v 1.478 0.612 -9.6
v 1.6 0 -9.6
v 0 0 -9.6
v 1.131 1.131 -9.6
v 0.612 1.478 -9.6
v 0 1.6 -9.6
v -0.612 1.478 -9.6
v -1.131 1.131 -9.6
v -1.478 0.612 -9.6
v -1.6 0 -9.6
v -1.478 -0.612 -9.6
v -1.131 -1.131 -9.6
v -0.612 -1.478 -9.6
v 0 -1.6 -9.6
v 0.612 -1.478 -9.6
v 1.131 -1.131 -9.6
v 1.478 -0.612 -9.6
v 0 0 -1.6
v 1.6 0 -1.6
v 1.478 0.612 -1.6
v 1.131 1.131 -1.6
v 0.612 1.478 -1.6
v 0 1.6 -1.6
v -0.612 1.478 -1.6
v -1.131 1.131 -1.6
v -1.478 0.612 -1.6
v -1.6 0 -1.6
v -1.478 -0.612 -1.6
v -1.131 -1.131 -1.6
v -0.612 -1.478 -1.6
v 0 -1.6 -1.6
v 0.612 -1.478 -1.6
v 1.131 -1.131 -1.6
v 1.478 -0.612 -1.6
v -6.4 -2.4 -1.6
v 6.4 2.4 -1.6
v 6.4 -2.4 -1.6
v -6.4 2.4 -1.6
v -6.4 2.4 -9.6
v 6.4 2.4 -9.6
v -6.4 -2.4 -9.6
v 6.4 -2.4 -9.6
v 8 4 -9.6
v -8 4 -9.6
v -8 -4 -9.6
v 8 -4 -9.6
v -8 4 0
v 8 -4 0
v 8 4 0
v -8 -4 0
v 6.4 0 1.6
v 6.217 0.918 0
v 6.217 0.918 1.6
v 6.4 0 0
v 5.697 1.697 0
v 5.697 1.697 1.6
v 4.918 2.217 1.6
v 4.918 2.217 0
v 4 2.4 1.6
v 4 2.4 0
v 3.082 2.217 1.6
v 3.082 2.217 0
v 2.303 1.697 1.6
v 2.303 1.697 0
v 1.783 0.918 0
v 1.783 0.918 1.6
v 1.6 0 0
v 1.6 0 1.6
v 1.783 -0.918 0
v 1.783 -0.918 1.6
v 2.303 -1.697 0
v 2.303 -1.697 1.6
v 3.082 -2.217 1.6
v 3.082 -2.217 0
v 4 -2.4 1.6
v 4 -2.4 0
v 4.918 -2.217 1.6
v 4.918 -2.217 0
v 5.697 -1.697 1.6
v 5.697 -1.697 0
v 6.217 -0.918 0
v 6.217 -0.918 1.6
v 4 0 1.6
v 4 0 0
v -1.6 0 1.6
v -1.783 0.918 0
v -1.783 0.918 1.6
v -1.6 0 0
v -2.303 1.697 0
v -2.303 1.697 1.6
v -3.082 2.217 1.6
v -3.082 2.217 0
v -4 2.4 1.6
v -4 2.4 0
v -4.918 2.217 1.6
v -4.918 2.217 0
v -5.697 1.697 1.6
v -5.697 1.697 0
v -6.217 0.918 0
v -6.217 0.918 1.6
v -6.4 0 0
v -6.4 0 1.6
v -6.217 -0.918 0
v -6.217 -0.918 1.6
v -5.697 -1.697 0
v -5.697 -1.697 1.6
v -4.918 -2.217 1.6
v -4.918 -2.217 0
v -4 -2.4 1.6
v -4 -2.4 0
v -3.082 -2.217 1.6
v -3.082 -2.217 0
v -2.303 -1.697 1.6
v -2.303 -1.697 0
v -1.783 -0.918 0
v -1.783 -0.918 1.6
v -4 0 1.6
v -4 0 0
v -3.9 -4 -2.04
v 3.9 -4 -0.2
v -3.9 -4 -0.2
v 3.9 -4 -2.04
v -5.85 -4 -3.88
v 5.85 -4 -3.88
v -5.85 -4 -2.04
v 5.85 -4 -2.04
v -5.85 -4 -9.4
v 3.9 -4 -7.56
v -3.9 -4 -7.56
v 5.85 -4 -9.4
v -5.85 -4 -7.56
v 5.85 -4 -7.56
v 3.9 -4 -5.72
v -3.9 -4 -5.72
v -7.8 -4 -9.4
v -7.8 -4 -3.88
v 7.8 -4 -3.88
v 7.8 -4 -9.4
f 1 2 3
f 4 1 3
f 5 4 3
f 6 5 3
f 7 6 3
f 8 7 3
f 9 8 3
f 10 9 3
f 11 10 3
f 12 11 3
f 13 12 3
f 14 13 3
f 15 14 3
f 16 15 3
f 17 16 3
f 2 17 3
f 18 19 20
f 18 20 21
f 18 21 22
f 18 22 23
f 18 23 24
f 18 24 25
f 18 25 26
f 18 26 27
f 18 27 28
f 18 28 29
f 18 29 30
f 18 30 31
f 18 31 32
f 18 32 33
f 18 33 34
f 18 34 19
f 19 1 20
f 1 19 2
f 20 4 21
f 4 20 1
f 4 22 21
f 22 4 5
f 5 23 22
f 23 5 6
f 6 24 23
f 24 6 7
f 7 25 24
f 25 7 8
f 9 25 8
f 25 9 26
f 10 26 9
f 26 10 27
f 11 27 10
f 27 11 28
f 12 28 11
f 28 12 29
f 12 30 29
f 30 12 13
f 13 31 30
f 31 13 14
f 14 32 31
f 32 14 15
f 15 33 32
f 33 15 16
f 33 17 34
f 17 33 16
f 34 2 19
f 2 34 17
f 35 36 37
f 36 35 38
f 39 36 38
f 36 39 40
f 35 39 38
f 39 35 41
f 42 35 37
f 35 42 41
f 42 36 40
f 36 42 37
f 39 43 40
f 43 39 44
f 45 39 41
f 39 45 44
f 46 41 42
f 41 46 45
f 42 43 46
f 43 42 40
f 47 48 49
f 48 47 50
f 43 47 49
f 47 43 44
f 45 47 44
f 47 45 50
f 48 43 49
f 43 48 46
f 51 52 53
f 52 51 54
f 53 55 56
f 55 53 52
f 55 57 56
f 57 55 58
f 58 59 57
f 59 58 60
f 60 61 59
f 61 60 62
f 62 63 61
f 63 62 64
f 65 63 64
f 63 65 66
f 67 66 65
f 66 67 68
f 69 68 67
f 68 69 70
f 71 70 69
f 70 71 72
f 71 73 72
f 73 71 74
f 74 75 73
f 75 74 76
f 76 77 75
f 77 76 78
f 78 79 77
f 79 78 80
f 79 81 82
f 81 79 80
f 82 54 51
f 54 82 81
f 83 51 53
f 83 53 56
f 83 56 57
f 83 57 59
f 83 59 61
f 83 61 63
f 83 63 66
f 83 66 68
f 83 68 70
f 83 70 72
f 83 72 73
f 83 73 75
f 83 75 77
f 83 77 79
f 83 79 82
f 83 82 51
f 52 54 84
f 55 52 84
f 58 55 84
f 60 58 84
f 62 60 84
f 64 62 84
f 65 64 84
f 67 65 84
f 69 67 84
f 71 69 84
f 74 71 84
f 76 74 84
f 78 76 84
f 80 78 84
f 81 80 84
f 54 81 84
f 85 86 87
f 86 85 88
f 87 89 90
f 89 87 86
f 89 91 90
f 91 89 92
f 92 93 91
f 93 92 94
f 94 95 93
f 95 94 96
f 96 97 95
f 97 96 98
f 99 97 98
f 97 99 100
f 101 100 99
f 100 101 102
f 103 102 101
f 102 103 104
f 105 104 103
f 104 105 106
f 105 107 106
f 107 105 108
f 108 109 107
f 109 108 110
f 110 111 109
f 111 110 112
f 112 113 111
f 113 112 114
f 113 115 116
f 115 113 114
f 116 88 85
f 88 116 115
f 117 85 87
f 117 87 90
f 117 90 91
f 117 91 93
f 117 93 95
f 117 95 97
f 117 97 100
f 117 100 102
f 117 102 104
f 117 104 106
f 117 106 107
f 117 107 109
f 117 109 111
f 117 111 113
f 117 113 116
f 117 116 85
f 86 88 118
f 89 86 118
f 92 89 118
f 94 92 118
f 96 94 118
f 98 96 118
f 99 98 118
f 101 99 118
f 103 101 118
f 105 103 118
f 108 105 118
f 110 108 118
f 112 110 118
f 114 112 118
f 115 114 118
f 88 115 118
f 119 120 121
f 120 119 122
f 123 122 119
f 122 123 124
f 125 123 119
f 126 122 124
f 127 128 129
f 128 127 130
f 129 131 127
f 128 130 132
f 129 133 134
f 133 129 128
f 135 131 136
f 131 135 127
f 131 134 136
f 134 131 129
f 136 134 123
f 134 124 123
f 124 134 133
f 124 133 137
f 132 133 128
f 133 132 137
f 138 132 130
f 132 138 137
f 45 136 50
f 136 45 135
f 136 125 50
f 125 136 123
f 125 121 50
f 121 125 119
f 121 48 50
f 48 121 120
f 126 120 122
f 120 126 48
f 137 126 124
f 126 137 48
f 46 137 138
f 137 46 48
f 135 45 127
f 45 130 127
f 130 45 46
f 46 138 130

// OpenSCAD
// file: ../p/4-4edge.scad
use <../lib.scad>
function ldraw_lib__4_4edge() = [
// 0 Circle 1.0
// 0 Name: 4-4edge.dat
// 0 Author: James Jessiman
// 0 !LDRAW_ORG Primitive UPDATE 2017-01
// 0 !LICENSE Licensed under CC BY 2.0 and CC BY 4.0 : see CAreadme.txt
// 
// 0 BFC CERTIFY CCW
  [0,"BFC","CERTIFY"],
  [0,"BFC","CCW"],
// 
// 0 !HISTORY 1998-12-15 [PTadmin] Official Update 1998-10
// 0 !HISTORY 2005-12-28 [PTadmin] Official Update 2005-01
// 0 !HISTORY 2007-06-24 [PTadmin] Header formatted for Contributor Agreement
// 0 !HISTORY 2008-07-01 [PTadmin] Official Update 2008-01
// 0 !HISTORY 2017-01-15 [Steffen] BFCed
// 0 !HISTORY 2017-12-30 [PTadmin] Official Update 2017-01
// 
// 
// 2 24 1 0 0 0.9239 0 0.3827
  [2,24,1,0,0,0.9239,0,0.3827],
// 2 24 0.9239 0 0.3827 0.7071 0 0.7071
  [2,24,0.9239,0,0.3827,0.7071,0,0.7071],
// 2 24 0.7071 0 0.7071 0.3827 0 0.9239
  [2,24,0.7071,0,0.7071,0.3827,0,0.9239],
// 2 24 0.3827 0 0.9239 0 0 1
  [2,24,0.3827,0,0.9239,0,0,1],
// 2 24 0 0 1 -0.3827 0 0.9239
  [2,24,0,0,1,-0.3827,0,0.9239],
// 2 24 -0.3827 0 0.9239 -0.7071 0 0.7071
  [2,24,-0.3827,0,0.9239,-0.7071,0,0.7071],
// 2 24 -0.7071 0 0.7071 -0.9239 0 0.3827
  [2,24,-0.7071,0,0.7071,-0.9239,0,0.3827],
// 2 24 -0.9239 0 0.3827 -1 0 -0
  [2,24,-0.9239,0,0.3827,-1,0,-0],
// 2 24 -1 0 -0 -0.9239 0 -0.3827
  [2,24,-1,0,-0,-0.9239,0,-0.3827],
// 2 24 -0.9239 0 -0.3827 -0.7071 0 -0.7071
  [2,24,-0.9239,0,-0.3827,-0.7071,0,-0.7071],
// 2 24 -0.7071 0 -0.7071 -0.3827 0 -0.9239
  [2,24,-0.7071,0,-0.7071,-0.3827,0,-0.9239],
// 2 24 -0.3827 0 -0.9239 0 0 -1
  [2,24,-0.3827,0,-0.9239,0,0,-1],
// 2 24 0 0 -1 0.3827 0 -0.9239
  [2,24,0,0,-1,0.3827,0,-0.9239],
// 2 24 0.3827 0 -0.9239 0.7071 0 -0.7071
  [2,24,0.3827,0,-0.9239,0.7071,0,-0.7071],
// 2 24 0.7071 0 -0.7071 0.9239 0 -0.3827
  [2,24,0.7071,0,-0.7071,0.9239,0,-0.3827],
// 2 24 0.9239 0 -0.3827 1 0 0
  [2,24,0.9239,0,-0.3827,1,0,0],
];
module ldraw_lib__4_4edge(step=0, col=false, unit=2/5, alt=false, line=0.2, solid=!$preview)
    makepoly(ldraw_lib__4_4edge(), step=step, col=col, unit=unit, alt=alt, line=line, solid=solid);
ldraw_lib__4_4edge(line=0.2);
// file: ../p/4-4disc.scad
use <../lib.scad>
function ldraw_lib__4_4disc() = [
// 0 Disc 1.0
// 0 Name: 4-4disc.dat
// 0 Author: James Jessiman
// 0 !LDRAW_ORG Primitive UPDATE 2002-02
// 0 !LICENSE Licensed under CC BY 2.0 and CC BY 4.0 : see CAreadme.txt
// 
// 0 BFC CERTIFY CCW
  [0,"BFC","CERTIFY"],
  [0,"BFC","CCW"],
// 
// 0 !HISTORY 1998-12-15 [PTadmin] Official Update 1998-10
// 0 !HISTORY 2002-03-23 [sbliss] Added BFC statement
// 0 !HISTORY 2002-04-25 [PTadmin] Official Update 2002-02
// 0 !HISTORY 2007-06-24 [PTadmin] Header formatted for Contributor Agreement
// 0 !HISTORY 2008-07-01 [PTadmin] Official Update 2008-01
// 
// 
// 3 16 0 0 0 1 0 0 0.9239 0 0.3827
  [3,16,0,0,0,1,0,0,0.9239,0,0.3827],
// 3 16 0 0 0 0.9239 0 0.3827 0.7071 0 0.7071
  [3,16,0,0,0,0.9239,0,0.3827,0.7071,0,0.7071],
// 3 16 0 0 0 0.7071 0 0.7071 0.3827 0 0.9239
  [3,16,0,0,0,0.7071,0,0.7071,0.3827,0,0.9239],
// 3 16 0 0 0 0.3827 0 0.9239 0 0 1
  [3,16,0,0,0,0.3827,0,0.9239,0,0,1],
// 3 16 0 0 0 0 0 1 -0.3827 0 0.9239
  [3,16,0,0,0,0,0,1,-0.3827,0,0.9239],
// 3 16 0 0 0 -0.3827 0 0.9239 -0.7071 0 0.7071
  [3,16,0,0,0,-0.3827,0,0.9239,-0.7071,0,0.7071],
// 3 16 0 0 0 -0.7071 0 0.7071 -0.9239 0 0.3827
  [3,16,0,0,0,-0.7071,0,0.7071,-0.9239,0,0.3827],
// 3 16 0 0 0 -0.9239 0 0.3827 -1 0 -0
  [3,16,0,0,0,-0.9239,0,0.3827,-1,0,-0],
// 3 16 0 0 0 -1 0 -0 -0.9239 0 -0.3827
  [3,16,0,0,0,-1,0,-0,-0.9239,0,-0.3827],
// 3 16 0 0 0 -0.9239 0 -0.3827 -0.7071 0 -0.7071
  [3,16,0,0,0,-0.9239,0,-0.3827,-0.7071,0,-0.7071],
// 3 16 0 0 0 -0.7071 0 -0.7071 -0.3827 0 -0.9239
  [3,16,0,0,0,-0.7071,0,-0.7071,-0.3827,0,-0.9239],
// 3 16 0 0 0 -0.3827 0 -0.9239 0 0 -1
  [3,16,0,0,0,-0.3827,0,-0.9239,0,0,-1],
// 3 16 0 0 0 0 0 -1 0.3827 0 -0.9239
  [3,16,0,0,0,0,0,-1,0.3827,0,-0.9239],
// 3 16 0 0 0 0.3827 0 -0.9239 0.7071 0 -0.7071
  [3,16,0,0,0,0.3827,0,-0.9239,0.7071,0,-0.7071],
// 3 16 0 0 0 0.7071 0 -0.7071 0.9239 0 -0.3827
  [3,16,0,0,0,0.7071,0,-0.7071,0.9239,0,-0.3827],
// 3 16 0 0 0 0.9239 0 -0.3827 1 0 0
  [3,16,0,0,0,0.9239,0,-0.3827,1,0,0],
// 0
];
module ldraw_lib__4_4disc(step=0, col=false, unit=2/5, alt=false, line=0.2, solid=!$preview)
    makepoly(ldraw_lib__4_4disc(), step=step, col=col, unit=unit, alt=alt, line=line, solid=solid);
ldraw_lib__4_4disc(line=0.2);
// file: ../p/4-4cyli.scad
use <../lib.scad>
$fa=1; $fs=0.2;
function ldraw_lib__4_4cyli(realsolid=false) = [
// 0 Cylinder 1.0
// 0 Name: 4-4cyli.dat
// 0 Author: James Jessiman
// 0 !LDRAW_ORG Primitive UPDATE 2005-01
// 0 !LICENSE Licensed under CC BY 2.0 and CC BY 4.0 : see CAreadme.txt
// 
// 0 BFC CERTIFY CCW
  [0,"BFC","CERTIFY"],
  [0,"BFC","CCW"],
// 
// 0 !HISTORY 1998-12-15 [PTadmin] Official Update 1998-10
// 0 !HISTORY 2002-03-23 [sbliss] Added BFC statement; merged headers from files in distributions LDraw 0.27 and Complete.
// 0 !HISTORY 2002-04-25 [PTadmin] Official Update 2002-02
// 0 !HISTORY 2004-12-14 [guyvivan] BFC CCW
// 0 !HISTORY 2005-12-28 [PTadmin] Official Update 2005-01
// 0 !HISTORY 2007-06-24 [PTadmin] Header formatted for Contributor Agreement
// 0 !HISTORY 2008-07-01 [PTadmin] Official Update 2008-01
// 
// 
// 4 16 1 1 0 0.9239 1 0.3827 0.9239 0 0.3827 1 0 0
  [4,16,1,1,0,0.9239,1,0.3827,0.9239,0,0.3827,1,0,0],
// 5 24 1 0 0 1 1 0 0.9239 0 0.3827 0.9239 0 -0.3827
  [5,24,1,0,0,1,1,0,0.9239,0,0.3827,0.9239,0,-0.3827],
// 4 16 0.9239 1 0.3827 0.7071 1 0.7071 0.7071 0 0.7071 0.9239 0 0.3827
  [4,16,0.9239,1,0.3827,0.7071,1,0.7071,0.7071,0,0.7071,0.9239,0,0.3827],
// 5 24 0.9239 0 0.3827 0.9239 1 0.3827 0.7071 0 0.7071 1 0 0
  [5,24,0.9239,0,0.3827,0.9239,1,0.3827,0.7071,0,0.7071,1,0,0],
// 4 16 0.7071 1 0.7071 0.3827 1 0.9239 0.3827 0 0.9239 0.7071 0 0.7071
  [4,16,0.7071,1,0.7071,0.3827,1,0.9239,0.3827,0,0.9239,0.7071,0,0.7071],
// 5 24 0.7071 0 0.7071 0.7071 1 0.7071 0.3827 0 0.9239 0.9239 0 0.3827
  [5,24,0.7071,0,0.7071,0.7071,1,0.7071,0.3827,0,0.9239,0.9239,0,0.3827],
// 4 16 0.3827 1 0.9239 0 1 1 0 0 1 0.3827 0 0.9239
  [4,16,0.3827,1,0.9239,0,1,1,0,0,1,0.3827,0,0.9239],
// 5 24 0.3827 0 0.9239 0.3827 1 0.9239 0 0 1 0.7071 0 0.7071
  [5,24,0.3827,0,0.9239,0.3827,1,0.9239,0,0,1,0.7071,0,0.7071],
// 4 16 0 1 1 -0.3827 1 0.9239 -0.3827 0 0.9239 0 0 1
  [4,16,0,1,1,-0.3827,1,0.9239,-0.3827,0,0.9239,0,0,1],
// 5 24 0 0 1 0 1 1 -0.3827 0 0.9239 0.3827 0 0.9239
  [5,24,0,0,1,0,1,1,-0.3827,0,0.9239,0.3827,0,0.9239],
// 4 16 -0.3827 1 0.9239 -0.7071 1 0.7071 -0.7071 0 0.7071 -0.3827 0 0.9239
  [4,16,-0.3827,1,0.9239,-0.7071,1,0.7071,-0.7071,0,0.7071,-0.3827,0,0.9239],
// 5 24 -0.3827 0 0.9239 -0.3827 1 0.9239 -0.7071 0 0.7071 0 0 1
  [5,24,-0.3827,0,0.9239,-0.3827,1,0.9239,-0.7071,0,0.7071,0,0,1],
// 4 16 -0.7071 1 0.7071 -0.9239 1 0.3827 -0.9239 0 0.3827 -0.7071 0 0.7071
  [4,16,-0.7071,1,0.7071,-0.9239,1,0.3827,-0.9239,0,0.3827,-0.7071,0,0.7071],
// 5 24 -0.7071 0 0.7071 -0.7071 1 0.7071 -0.9239 0 0.3827 -0.3827 0 0.9239
  [5,24,-0.7071,0,0.7071,-0.7071,1,0.7071,-0.9239,0,0.3827,-0.3827,0,0.9239],
// 4 16 -0.9239 1 0.3827 -1 1 0 -1 0 0 -0.9239 0 0.3827
  [4,16,-0.9239,1,0.3827,-1,1,0,-1,0,0,-0.9239,0,0.3827],
// 5 24 -0.9239 0 0.3827 -0.9239 1 0.3827 -1 0 0 -0.7071 0 0.7071
  [5,24,-0.9239,0,0.3827,-0.9239,1,0.3827,-1,0,0,-0.7071,0,0.7071],
// 4 16 -1 1 0 -0.9239 1 -0.3827 -0.9239 0 -0.3827 -1 0 0
  [4,16,-1,1,0,-0.9239,1,-0.3827,-0.9239,0,-0.3827,-1,0,0],
// 5 24 -1 0 0 -1 1 0 -0.9239 0 -0.3827 -0.9239 0 0.3827
  [5,24,-1,0,0,-1,1,0,-0.9239,0,-0.3827,-0.9239,0,0.3827],
// 4 16 -0.9239 1 -0.3827 -0.7071 1 -0.7071 -0.7071 0 -0.7071 -0.9239 0 -0.3827
  [4,16,-0.9239,1,-0.3827,-0.7071,1,-0.7071,-0.7071,0,-0.7071,-0.9239,0,-0.3827],
// 5 24 -0.9239 0 -0.3827 -0.9239 1 -0.3827 -0.7071 0 -0.7071 -1 0 0
  [5,24,-0.9239,0,-0.3827,-0.9239,1,-0.3827,-0.7071,0,-0.7071,-1,0,0],
// 4 16 -0.7071 1 -0.7071 -0.3827 1 -0.9239 -0.3827 0 -0.9239 -0.7071 0 -0.7071
  [4,16,-0.7071,1,-0.7071,-0.3827,1,-0.9239,-0.3827,0,-0.9239,-0.7071,0,-0.7071],
// 5 24 -0.7071 0 -0.7071 -0.7071 1 -0.7071 -0.3827 0 -0.9239 -0.9239 0 -0.3827
  [5,24,-0.7071,0,-0.7071,-0.7071,1,-0.7071,-0.3827,0,-0.9239,-0.9239,0,-0.3827],
// 4 16 -0.3827 1 -0.9239 0 1 -1 0 0 -1 -0.3827 0 -0.9239
  [4,16,-0.3827,1,-0.9239,0,1,-1,0,0,-1,-0.3827,0,-0.9239],
// 5 24 -0.3827 0 -0.9239 -0.3827 1 -0.9239 0 0 -1 -0.7071 0 -0.7071
  [5,24,-0.3827,0,-0.9239,-0.3827,1,-0.9239,0,0,-1,-0.7071,0,-0.7071],
// 4 16 0 1 -1 0.3827 1 -0.9239 0.3827 0 -0.9239 0 0 -1
  [4,16,0,1,-1,0.3827,1,-0.9239,0.3827,0,-0.9239,0,0,-1],
// 5 24 0 0 -1 0 1 -1 0.3827 0 -0.9239 -0.3827 0 -0.9239
  [5,24,0,0,-1,0,1,-1,0.3827,0,-0.9239,-0.3827,0,-0.9239],
// 4 16 0.3827 1 -0.9239 0.7071 1 -0.7071 0.7071 0 -0.7071 0.3827 0 -0.9239
  [4,16,0.3827,1,-0.9239,0.7071,1,-0.7071,0.7071,0,-0.7071,0.3827,0,-0.9239],
// 5 24 0.3827 0 -0.9239 0.3827 1 -0.9239 0.7071 0 -0.7071 0 0 -1
  [5,24,0.3827,0,-0.9239,0.3827,1,-0.9239,0.7071,0,-0.7071,0,0,-1],
// 4 16 0.7071 1 -0.7071 0.9239 1 -0.3827 0.9239 0 -0.3827 0.7071 0 -0.7071
  [4,16,0.7071,1,-0.7071,0.9239,1,-0.3827,0.9239,0,-0.3827,0.7071,0,-0.7071],
// 5 24 0.7071 0 -0.7071 0.7071 1 -0.7071 0.9239 0 -0.3827 0.3827 0 -0.9239
  [5,24,0.7071,0,-0.7071,0.7071,1,-0.7071,0.9239,0,-0.3827,0.3827,0,-0.9239],
// 4 16 0.9239 1 -0.3827 1 1 0 1 0 0 0.9239 0 -0.3827
  [4,16,0.9239,1,-0.3827,1,1,0,1,0,0,0.9239,0,-0.3827],
// 5 24 0.9239 0 -0.3827 0.9239 1 -0.3827 1 0 0 0.7071 0 -0.7071
  [5,24,0.9239,0,-0.3827,0.9239,1,-0.3827,1,0,0,0.7071,0,-0.7071],
// 0
];
module ldraw_lib__4_4cyli(step=0, col=false, unit=2/5, alt=false, line=0.2, solid=!$preview)
    makepoly(ldraw_lib__4_4cyli(solid), step=step, col=col, unit=unit, alt=alt, line=line, solid=solid);
ldraw_lib__4_4cyli(line=0.2);
// file: ../p/stud3.scad
use <../lib.scad>
use <4-4cyli.scad>
use <4-4disc.scad>
use <4-4edge.scad>
function ldraw_lib__stud3() = [
// 0 Stud Tube Solid
// 0 Name: stud3.dat
// 0 Author: James Jessiman
// 0 !LDRAW_ORG Primitive UPDATE 2012-01
// 0 !LICENSE Licensed under CC BY 4.0 : see CAreadme.txt
// 
// 0 BFC CERTIFY CCW
  [0,"BFC","CERTIFY"],
  [0,"BFC","CCW"],
// 
// 0 !HISTORY 2002-04-04 [sbliss] Modified for BFC compliance
// 0 !HISTORY 2002-04-25 [PTadmin] Official Update 2002-02
// 0 !HISTORY 2007-06-24 [PTadmin] Header formatted for Contributor Agreement
// 0 !HISTORY 2008-07-01 [PTadmin] Official Update 2008-01
// 0 !HISTORY 2012-02-16 [Philo] Changed to CCW
// 0 !HISTORY 2012-03-30 [PTadmin] Official Update 2012-01
// 
// 
// 1 16 0 -4 0 4 0 0 0 1 0 0 0 4 4-4edge.dat
  [1,16,0,-4,0,4,0,0,0,1,0,0,0,4, ldraw_lib__4_4edge()],
// 1 16 0 0 0 4 0 0 0 1 0 0 0 4 4-4edge.dat
  [1,16,0,0,0,4,0,0,0,1,0,0,0,4, ldraw_lib__4_4edge()],
// 1 16 0 -4 0 4 0 0 0 1 0 0 0 4 4-4disc.dat
  [1,16,0,-4,0,4,0,0,0,1,0,0,0,4, ldraw_lib__4_4disc()],
  [-1,16,0,0,0,4,0,0,0,-1,0,0,0,4, ldraw_lib__4_4disc()],
// 1 16 0 -4 0 4 0 0 0 4 0 0 0 4 4-4cyli.dat
  [1,16,0,-4,0,4,0,0,0,4,0,0,0,4, ldraw_lib__4_4cyli()],
];
module ldraw_lib__stud3(step=0, col=false, unit=2/5, alt=false, line=0.2, solid=!$preview)
    makepoly(ldraw_lib__stud3(), step=step, col=col, unit=unit, alt=alt, line=line, solid=solid);
ldraw_lib__stud3(line=0.2);
// file: ../p/stud.scad
use <../lib.scad>
use <4-4cyli.scad>
use <4-4disc.scad>
use <4-4edge.scad>
function ldraw_lib__stud() = [
// 0 Stud
// 0 Name: stud.dat
// 0 Author: James Jessiman
// 0 !LDRAW_ORG Primitive UPDATE 2012-01
// 0 !LICENSE Licensed under CC BY 4.0 : see CAreadme.txt
// 
// 0 BFC CERTIFY CCW
  [0,"BFC","CERTIFY"],
  [0,"BFC","CCW"],
// 
// 0 !HISTORY 2002-04-04 [sbliss] Modified for BFC compliance
// 0 !HISTORY 2002-04-25 [PTadmin] Official Update 2002-02
// 0 !HISTORY 2007-06-24 [PTadmin] Header formatted for Contributor Agreement
// 0 !HISTORY 2008-07-01 [PTadmin] Official Update 2008-01
// 0 !HISTORY 2012-02-16 [Philo] Changed to CCW
// 0 !HISTORY 2012-03-30 [PTadmin] Official Update 2012-01
// 
// 
// 1 16 0 0 0 6 0 0 0 1 0 0 0 6 4-4edge.dat
  [1,16,0,0,0,6,0,0,0,1,0,0,0,6, ldraw_lib__4_4edge()],
// 1 16 0 -4 0 6 0 0 0 1 0 0 0 6 4-4edge.dat
  [1,16,0,-4,0,6,0,0,0,1,0,0,0,6, ldraw_lib__4_4edge()],
// 1 16 0 0 0 6 0 0 0 -4 0 0 0 6 4-4cyli.dat
  [1,16,0,0,0,6,0,0,0,-4,0,0,0,6, ldraw_lib__4_4cyli()],
// 1 16 0 -4 0 6 0 0 0 1 0 0 0 6 4-4disc.dat
  [1,16,0,-4,0,6,0,0,0,1,0,0,0,6, ldraw_lib__4_4disc()],
  [-1,16,0,0,0,6,0,0,0,-1,0,0,0,6, ldraw_lib__4_4disc()],
];
module ldraw_lib__stud(step=0, col=false, unit=2/5, alt=false, line=0.2, solid=!$preview)
    makepoly(ldraw_lib__stud(), step=step, col=col, unit=unit, alt=alt, line=line, solid=solid);
ldraw_lib__stud(line=0.2);
// file: ../p/box5.scad
use <../lib.scad>
function ldraw_lib__box5() = [
// 0 Box with 5 Faces and All Edges
// 0 Name: box5.dat
// 0 Author: James Jessiman
// 0 !LDRAW_ORG Primitive UPDATE 2012-01
// 0 !LICENSE Licensed under CC BY 2.0 and CC BY 4.0 : see CAreadme.txt
// 
// 0 BFC CERTIFY CCW
  [0,"BFC","CERTIFY"],
  [0,"BFC","CCW"],
// 
// 0 !HISTORY 2002-04-03 [sbliss] Modified for BFC compliance
// 0 !HISTORY 2002-04-25 [PTadmin] Official Update 2002-02
// 0 !HISTORY 2007-06-24 [PTadmin] Header formatted for Contributor Agreement
// 0 !HISTORY 2008-07-01 [PTadmin] Official Update 2008-01
// 0 !HISTORY 2012-02-16 [Philo] Changed to CCW
// 0 !HISTORY 2012-03-30 [PTadmin] Official Update 2012-01
// 
// 
// 2 24 1 1 1 -1 1 1
  [2,24,1,1,1,-1,1,1],
// 2 24 -1 1 1 -1 1 -1
  [2,24,-1,1,1,-1,1,-1],
// 2 24 -1 1 -1 1 1 -1
  [2,24,-1,1,-1,1,1,-1],
// 2 24 1 1 -1 1 1 1
  [2,24,1,1,-1,1,1,1],
// 2 24 1 0 1 -1 0 1
  [2,24,1,0,1,-1,0,1],
// 2 24 -1 0 1 -1 0 -1
  [2,24,-1,0,1,-1,0,-1],
// 2 24 -1 0 -1 1 0 -1
  [2,24,-1,0,-1,1,0,-1],
// 2 24 1 0 -1 1 0 1
  [2,24,1,0,-1,1,0,1],
// 2 24 1 0 1 1 1 1
  [2,24,1,0,1,1,1,1],
// 2 24 -1 0 1 -1 1 1
  [2,24,-1,0,1,-1,1,1],
// 2 24 1 0 -1 1 1 -1
  [2,24,1,0,-1,1,1,-1],
// 2 24 -1 0 -1 -1 1 -1
  [2,24,-1,0,-1,-1,1,-1],
// 4 16 -1 1 1 1 1 1 1 1 -1 -1 1 -1
  [4,16,-1,1,1,1,1,1,1,1,-1,-1,1,-1],
// 4 16 -1 1 1 -1 0 1 1 0 1 1 1 1
  [4,16,-1,1,1,-1,0,1,1,0,1,1,1,1],
// 4 16 -1 1 -1 -1 0 -1 -1 0 1 -1 1 1
  [4,16,-1,1,-1,-1,0,-1,-1,0,1,-1,1,1],
// 4 16 1 1 -1 1 0 -1 -1 0 -1 -1 1 -1
  [4,16,1,1,-1,1,0,-1,-1,0,-1,-1,1,-1],
// 4 16 1 1 1 1 0 1 1 0 -1 1 1 -1
  [4,16,1,1,1,1,0,1,1,0,-1,1,1,-1],
];
makepoly(ldraw_lib__box5(), line=0.2);
// file: ../p/box4t.scad
use <../lib.scad>
function ldraw_lib__box4t() = [
// 0 Box with 4 Adjacent Faces and All Edges
// 0 Name: box4t.dat
// 0 Author: Tore Eriksson [Tore_Eriksson]
// 0 !LDRAW_ORG Primitive UPDATE 2003-02
// 0 !LICENSE Licensed under CC BY 2.0 and CC BY 4.0 : see CAreadme.txt
// 
// 0 BFC CERTIFY CCW
  [0,"BFC","CERTIFY"],
  [0,"BFC","CCW"],
// 
// 0 !HISTORY 1997-09-29 [PTadmin] Official Update 1997-15
// 0 !HISTORY 2002-08-31 [izanette] Modified with WINDZ for BFC compliance
// 0 !HISTORY 2003-08-01 [PTadmin] Official Update 2003-02
// 0 !HISTORY 2007-06-24 [PTadmin] Header formatted for Contributor Agreement
// 0 !HISTORY 2008-07-01 [PTadmin] Official Update 2008-01
// 
// 
// 2 24 1 1 1 -1 1 1
  [2,24,1,1,1,-1,1,1],
// 2 24 -1 1 1 -1 1 -1
  [2,24,-1,1,1,-1,1,-1],
// 2 24 -1 1 -1 1 1 -1
  [2,24,-1,1,-1,1,1,-1],
// 2 24 1 1 -1 1 1 1
  [2,24,1,1,-1,1,1,1],
// 2 24 1 0 1 -1 0 1
  [2,24,1,0,1,-1,0,1],
// 2 24 -1 0 1 -1 0 -1
  [2,24,-1,0,1,-1,0,-1],
// 2 24 -1 0 -1 1 0 -1
  [2,24,-1,0,-1,1,0,-1],
// 2 24 1 0 -1 1 0 1
  [2,24,1,0,-1,1,0,1],
// 2 24 1 0 1 1 1 1
  [2,24,1,0,1,1,1,1],
// 2 24 -1 0 1 -1 1 1
  [2,24,-1,0,1,-1,1,1],
// 2 24 1 0 -1 1 1 -1
  [2,24,1,0,-1,1,1,-1],
// 2 24 -1 0 -1 -1 1 -1
  [2,24,-1,0,-1,-1,1,-1],
// 4 16 1 1 1 1 1 -1 -1 1 -1 -1 1 1
  [4,16,1,1,1,1,1,-1,-1,1,-1,-1,1,1],
// 4 16 1 1 1 -1 1 1 -1 0 1 1 0 1
  [4,16,1,1,1,-1,1,1,-1,0,1,1,0,1],
// 4 16 -1 1 1 -1 1 -1 -1 0 -1 -1 0 1
  [4,16,-1,1,1,-1,1,-1,-1,0,-1,-1,0,1],
// 0 4 16 -1 1 -1 -1 0 -1 1 0 -1 1 1 -1
// 4 16 1 1 -1 1 1 1 1 0 1 1 0 -1
  [4,16,1,1,-1,1,1,1,1,0,1,1,0,-1],
// 0
];
makepoly(ldraw_lib__box4t(), line=0.2);
// file: s/3004s01.scad
use <../../lib.scad>
use <../../p/box4t.scad>
use <../../p/box5.scad>
use <../../p/stud.scad>
use <../../p/stud3.scad>
$fa=1; $fs=0.2;
function ldraw_lib__s__3004s01(realsolid=false) = [
// 0 ~Brick  1 x  2 without Front Face
// 0 Name: s\3004s01.dat
// 0 Author: James Jessiman
// 0 !LDRAW_ORG Subpart UPDATE 2003-03
// 0 !LICENSE Licensed under CC BY 2.0 and CC BY 4.0 : see CAreadme.txt
// 
// 0 BFC CERTIFY CCW
  [0,"BFC","CERTIFY"],
  [0,"BFC","CCW"],
// 
// 0 !HISTORY 2003-09-07 [jriley] Subfiling, BFC
// 0 !HISTORY 2003-12-19 [PTadmin] Official Update 2003-03
// 0 !HISTORY 2007-08-29 [PTadmin] Header formatted for Contributor Agreement
// 0 !HISTORY 2008-07-01 [PTadmin] Official Update 2008-01
// 
// 
// 1 16 0 4 0 1 0 0 0 -5 0 0 0 1 stud3.dat
  [1,16,0,4,0,1,0,0,0,-5,0,0,0,1, ldraw_lib__stud3(realsolid)],
// 0 BFC INVERTNEXT
  [0,"BFC","INVERTNEXT"],
// 1 16 0 24 0 16 0 0 0 -20 0 0 0 6 box5.dat
  [1,16,0,24,0,16,0,0,0,-20,0,0,0,6, ldraw_lib__box5(realsolid)],
// 4 16 20 24 10 16 24 6 -16 24 6 -20 24 10
  [4,16,20,24,10,16,24,6,-16,24,6,-20,24,10],
// 4 16 -20 24 10 -16 24 6 -16 24 -6 -20 24 -10
  [4,16,-20,24,10,-16,24,6,-16,24,-6,-20,24,-10],
// 4 16 -20 24 -10 -16 24 -6 16 24 -6 20 24 -10
  [4,16,-20,24,-10,-16,24,-6,16,24,-6,20,24,-10],
// 4 16 20 24 -10 16 24 -6 16 24 6 20 24 10
  [4,16,20,24,-10,16,24,-6,16,24,6,20,24,10],
// 1 16 0 24 0 20 0 0 0 -24 0 0 0 10 box4t.dat
  [1,16,0,24,0,20,0,0,0,-24,0,0,0,10, ldraw_lib__box4t(realsolid)],
// 1 16 10 0 0 1 0 0 0 1 0 0 0 1 stud.dat
  [1,16,10,0,0,1,0,0,0,1,0,0,0,1, ldraw_lib__stud(realsolid)],
// 1 16 -10 0 0 1 0 0 0 1 0 0 0 1 stud.dat
  [1,16,-10,0,0,1,0,0,0,1,0,0,0,1, ldraw_lib__stud(realsolid)],
// 0
];
module ldraw_lib__s__3004s01(step=0, col=false, unit=2/5, alt=false, line=0.2, solid=!$preview)
    makepoly(ldraw_lib__s__3004s01(solid), step=step, col=col, unit=unit, alt=alt, line=line, solid=solid);
ldraw_lib__s__3004s01(line=0.2);
// main file
use <../lib.scad>
use <s/3004s01.scad>
function ldraw_lib__3004px9() = [
// 0 Brick  1 x  2 with Pixelated Unlit Forge Pattern
// 0 Name: 3004px9.dat
// 0 Author: Vincent Messenet [Cheenzo]
// 0 !LDRAW_ORG Part UPDATE 2024-04
// 0 !LICENSE Licensed under CC BY 4.0 : see CAreadme.txt
// 
// 0 BFC CERTIFY CCW
  [0,"BFC","CERTIFY"],
  [0,"BFC","CCW"],
// 
// 0 !KEYWORDS BrickLink 3004pb161, Minecraft, set 21140, Set 21141, Set 21142
// 0 !KEYWORDS Set 21144, Set 21146, set 21147
// 
// 0 !HISTORY 2024-05-28 [OrionP] Official Update 2024-04
// 
// 1 16 0 0 0 1 0 0 0 1 0 0 0 1 s\3004s01.dat
  [1,16,0,0,0,1,0,0,0,1,0,0,0,1, ldraw_lib__s__3004s01()],
// 
// 4 0 -9.75 .5 -10 -9.75 5.1 -10 9.75 5.1 -10 9.75 .5 -10
  [4,0,-9.75,.5,-10,-9.75,5.1,-10,9.75,5.1,-10,9.75,.5,-10],
// 4 0 9.75 5.1 -10 -9.75 5.1 -10 -14.625 9.7 -10 14.625 9.7 -10
  [4,0,9.75,5.1,-10,-9.75,5.1,-10,-14.625,9.7,-10,14.625,9.7,-10],
// 3 0 -14.625 5.1 -10 -14.625 9.7 -10 -9.75 5.1 -10
  [3,0,-14.625,5.1,-10,-14.625,9.7,-10,-9.75,5.1,-10],
// 3 0 14.625 5.1 -10 9.75 5.1 -10 14.625 9.7 -10
  [3,0,14.625,5.1,-10,9.75,5.1,-10,14.625,9.7,-10],
// 4 0 -9.75 18.9 -10 -14.625 23.5 -10 14.625 23.5 -10 9.75 18.9 -10
  [4,0,-9.75,18.9,-10,-14.625,23.5,-10,14.625,23.5,-10,9.75,18.9,-10],
// 3 0 -9.75 18.9 -10 -14.625 18.9 -10 -14.625 23.5 -10
  [3,0,-9.75,18.9,-10,-14.625,18.9,-10,-14.625,23.5,-10],
// 3 0 9.75 18.9 -10 14.625 23.5 -10 14.625 18.9 -10
  [3,0,9.75,18.9,-10,14.625,23.5,-10,14.625,18.9,-10],
// 4 0 9.75 18.9 -10 9.75 14.3 -10 -9.75 14.3 -10 -9.75 18.9 -10
  [4,0,9.75,18.9,-10,9.75,14.3,-10,-9.75,14.3,-10,-9.75,18.9,-10],
// 4 71 -19.5 23.5 -10 -14.625 23.5 -10 -14.625 18.9 -10 -19.5 9.7 -10
  [4,71,-19.5,23.5,-10,-14.625,23.5,-10,-14.625,18.9,-10,-19.5,9.7,-10],
// 4 71 -9.75 14.3 -10 -19.5 9.7 -10 -14.625 18.9 -10 -9.75 18.9 -10
  [4,71,-9.75,14.3,-10,-19.5,9.7,-10,-14.625,18.9,-10,-9.75,18.9,-10],
// 3 71 -19.5 9.7 -10 -9.75 14.3 -10 -14.625 9.7 -10
  [3,71,-19.5,9.7,-10,-9.75,14.3,-10,-14.625,9.7,-10],
// 4 71 -14.625 9.7 -10 -9.75 14.3 -10 9.75 14.3 -10 14.625 9.7 -10
  [4,71,-14.625,9.7,-10,-9.75,14.3,-10,9.75,14.3,-10,14.625,9.7,-10],
// 3 71 14.625 9.7 -10 9.75 14.3 -10 19.5 9.7 -10
  [3,71,14.625,9.7,-10,9.75,14.3,-10,19.5,9.7,-10],
// 4 71 19.5 9.7 -10 9.75 14.3 -10 9.75 18.9 -10 14.625 18.9 -10
  [4,71,19.5,9.7,-10,9.75,14.3,-10,9.75,18.9,-10,14.625,18.9,-10],
// 4 71 14.625 18.9 -10 14.625 23.5 -10 19.5 23.5 -10 19.5 9.7 -10
  [4,71,14.625,18.9,-10,14.625,23.5,-10,19.5,23.5,-10,19.5,9.7,-10],
// 4 16 -20 24 -10 -19.5 23.5 -10 -19.5 9.7 -10 -20 0 -10
  [4,16,-20,24,-10,-19.5,23.5,-10,-19.5,9.7,-10,-20,0,-10],
// 4 16 -14.625 5.1 -10 -20 0 -10 -19.5 9.7 -10 -14.625 9.7 -10
  [4,16,-14.625,5.1,-10,-20,0,-10,-19.5,9.7,-10,-14.625,9.7,-10],
// 4 16 -14.625 5.1 -10 -9.75 5.1 -10 -9.75 .5 -10 -20 0 -10
  [4,16,-14.625,5.1,-10,-9.75,5.1,-10,-9.75,.5,-10,-20,0,-10],
// 4 16 -20 0 -10 -9.75 .5 -10 9.75 .5 -10 20 0 -10
  [4,16,-20,0,-10,-9.75,.5,-10,9.75,.5,-10,20,0,-10],
// 4 16 14.625 5.1 -10 20 0 -10 9.75 .5 -10 9.75 5.1 -10
  [4,16,14.625,5.1,-10,20,0,-10,9.75,.5,-10,9.75,5.1,-10],
// 4 16 19.5 9.7 -10 20 0 -10 14.625 5.1 -10 14.625 9.7 -10
  [4,16,19.5,9.7,-10,20,0,-10,14.625,5.1,-10,14.625,9.7,-10],
// 4 16 19.5 9.7 -10 19.5 23.5 -10 20 24 -10 20 0 -10
  [4,16,19.5,9.7,-10,19.5,23.5,-10,20,24,-10,20,0,-10],
// 3 16 -19.5 23.5 -10 -20 24 -10 -14.625 23.5 -10
  [3,16,-19.5,23.5,-10,-20,24,-10,-14.625,23.5,-10],
// 4 16 20 24 -10 14.625 23.5 -10 -14.625 23.5 -10 -20 24 -10
  [4,16,20,24,-10,14.625,23.5,-10,-14.625,23.5,-10,-20,24,-10],
// 3 16 20 24 -10 19.5 23.5 -10 14.625 23.5 -10
  [3,16,20,24,-10,19.5,23.5,-10,14.625,23.5,-10],
];
module ldraw_lib__3004px9(step=0, col=false, unit=2/5, alt=false, line=0.2, solid=!$preview)
    makepoly(ldraw_lib__3004px9(), step=step, col=col, unit=unit, alt=alt, line=line, solid=solid);
ldraw_lib__3004px9(line=0.2);
